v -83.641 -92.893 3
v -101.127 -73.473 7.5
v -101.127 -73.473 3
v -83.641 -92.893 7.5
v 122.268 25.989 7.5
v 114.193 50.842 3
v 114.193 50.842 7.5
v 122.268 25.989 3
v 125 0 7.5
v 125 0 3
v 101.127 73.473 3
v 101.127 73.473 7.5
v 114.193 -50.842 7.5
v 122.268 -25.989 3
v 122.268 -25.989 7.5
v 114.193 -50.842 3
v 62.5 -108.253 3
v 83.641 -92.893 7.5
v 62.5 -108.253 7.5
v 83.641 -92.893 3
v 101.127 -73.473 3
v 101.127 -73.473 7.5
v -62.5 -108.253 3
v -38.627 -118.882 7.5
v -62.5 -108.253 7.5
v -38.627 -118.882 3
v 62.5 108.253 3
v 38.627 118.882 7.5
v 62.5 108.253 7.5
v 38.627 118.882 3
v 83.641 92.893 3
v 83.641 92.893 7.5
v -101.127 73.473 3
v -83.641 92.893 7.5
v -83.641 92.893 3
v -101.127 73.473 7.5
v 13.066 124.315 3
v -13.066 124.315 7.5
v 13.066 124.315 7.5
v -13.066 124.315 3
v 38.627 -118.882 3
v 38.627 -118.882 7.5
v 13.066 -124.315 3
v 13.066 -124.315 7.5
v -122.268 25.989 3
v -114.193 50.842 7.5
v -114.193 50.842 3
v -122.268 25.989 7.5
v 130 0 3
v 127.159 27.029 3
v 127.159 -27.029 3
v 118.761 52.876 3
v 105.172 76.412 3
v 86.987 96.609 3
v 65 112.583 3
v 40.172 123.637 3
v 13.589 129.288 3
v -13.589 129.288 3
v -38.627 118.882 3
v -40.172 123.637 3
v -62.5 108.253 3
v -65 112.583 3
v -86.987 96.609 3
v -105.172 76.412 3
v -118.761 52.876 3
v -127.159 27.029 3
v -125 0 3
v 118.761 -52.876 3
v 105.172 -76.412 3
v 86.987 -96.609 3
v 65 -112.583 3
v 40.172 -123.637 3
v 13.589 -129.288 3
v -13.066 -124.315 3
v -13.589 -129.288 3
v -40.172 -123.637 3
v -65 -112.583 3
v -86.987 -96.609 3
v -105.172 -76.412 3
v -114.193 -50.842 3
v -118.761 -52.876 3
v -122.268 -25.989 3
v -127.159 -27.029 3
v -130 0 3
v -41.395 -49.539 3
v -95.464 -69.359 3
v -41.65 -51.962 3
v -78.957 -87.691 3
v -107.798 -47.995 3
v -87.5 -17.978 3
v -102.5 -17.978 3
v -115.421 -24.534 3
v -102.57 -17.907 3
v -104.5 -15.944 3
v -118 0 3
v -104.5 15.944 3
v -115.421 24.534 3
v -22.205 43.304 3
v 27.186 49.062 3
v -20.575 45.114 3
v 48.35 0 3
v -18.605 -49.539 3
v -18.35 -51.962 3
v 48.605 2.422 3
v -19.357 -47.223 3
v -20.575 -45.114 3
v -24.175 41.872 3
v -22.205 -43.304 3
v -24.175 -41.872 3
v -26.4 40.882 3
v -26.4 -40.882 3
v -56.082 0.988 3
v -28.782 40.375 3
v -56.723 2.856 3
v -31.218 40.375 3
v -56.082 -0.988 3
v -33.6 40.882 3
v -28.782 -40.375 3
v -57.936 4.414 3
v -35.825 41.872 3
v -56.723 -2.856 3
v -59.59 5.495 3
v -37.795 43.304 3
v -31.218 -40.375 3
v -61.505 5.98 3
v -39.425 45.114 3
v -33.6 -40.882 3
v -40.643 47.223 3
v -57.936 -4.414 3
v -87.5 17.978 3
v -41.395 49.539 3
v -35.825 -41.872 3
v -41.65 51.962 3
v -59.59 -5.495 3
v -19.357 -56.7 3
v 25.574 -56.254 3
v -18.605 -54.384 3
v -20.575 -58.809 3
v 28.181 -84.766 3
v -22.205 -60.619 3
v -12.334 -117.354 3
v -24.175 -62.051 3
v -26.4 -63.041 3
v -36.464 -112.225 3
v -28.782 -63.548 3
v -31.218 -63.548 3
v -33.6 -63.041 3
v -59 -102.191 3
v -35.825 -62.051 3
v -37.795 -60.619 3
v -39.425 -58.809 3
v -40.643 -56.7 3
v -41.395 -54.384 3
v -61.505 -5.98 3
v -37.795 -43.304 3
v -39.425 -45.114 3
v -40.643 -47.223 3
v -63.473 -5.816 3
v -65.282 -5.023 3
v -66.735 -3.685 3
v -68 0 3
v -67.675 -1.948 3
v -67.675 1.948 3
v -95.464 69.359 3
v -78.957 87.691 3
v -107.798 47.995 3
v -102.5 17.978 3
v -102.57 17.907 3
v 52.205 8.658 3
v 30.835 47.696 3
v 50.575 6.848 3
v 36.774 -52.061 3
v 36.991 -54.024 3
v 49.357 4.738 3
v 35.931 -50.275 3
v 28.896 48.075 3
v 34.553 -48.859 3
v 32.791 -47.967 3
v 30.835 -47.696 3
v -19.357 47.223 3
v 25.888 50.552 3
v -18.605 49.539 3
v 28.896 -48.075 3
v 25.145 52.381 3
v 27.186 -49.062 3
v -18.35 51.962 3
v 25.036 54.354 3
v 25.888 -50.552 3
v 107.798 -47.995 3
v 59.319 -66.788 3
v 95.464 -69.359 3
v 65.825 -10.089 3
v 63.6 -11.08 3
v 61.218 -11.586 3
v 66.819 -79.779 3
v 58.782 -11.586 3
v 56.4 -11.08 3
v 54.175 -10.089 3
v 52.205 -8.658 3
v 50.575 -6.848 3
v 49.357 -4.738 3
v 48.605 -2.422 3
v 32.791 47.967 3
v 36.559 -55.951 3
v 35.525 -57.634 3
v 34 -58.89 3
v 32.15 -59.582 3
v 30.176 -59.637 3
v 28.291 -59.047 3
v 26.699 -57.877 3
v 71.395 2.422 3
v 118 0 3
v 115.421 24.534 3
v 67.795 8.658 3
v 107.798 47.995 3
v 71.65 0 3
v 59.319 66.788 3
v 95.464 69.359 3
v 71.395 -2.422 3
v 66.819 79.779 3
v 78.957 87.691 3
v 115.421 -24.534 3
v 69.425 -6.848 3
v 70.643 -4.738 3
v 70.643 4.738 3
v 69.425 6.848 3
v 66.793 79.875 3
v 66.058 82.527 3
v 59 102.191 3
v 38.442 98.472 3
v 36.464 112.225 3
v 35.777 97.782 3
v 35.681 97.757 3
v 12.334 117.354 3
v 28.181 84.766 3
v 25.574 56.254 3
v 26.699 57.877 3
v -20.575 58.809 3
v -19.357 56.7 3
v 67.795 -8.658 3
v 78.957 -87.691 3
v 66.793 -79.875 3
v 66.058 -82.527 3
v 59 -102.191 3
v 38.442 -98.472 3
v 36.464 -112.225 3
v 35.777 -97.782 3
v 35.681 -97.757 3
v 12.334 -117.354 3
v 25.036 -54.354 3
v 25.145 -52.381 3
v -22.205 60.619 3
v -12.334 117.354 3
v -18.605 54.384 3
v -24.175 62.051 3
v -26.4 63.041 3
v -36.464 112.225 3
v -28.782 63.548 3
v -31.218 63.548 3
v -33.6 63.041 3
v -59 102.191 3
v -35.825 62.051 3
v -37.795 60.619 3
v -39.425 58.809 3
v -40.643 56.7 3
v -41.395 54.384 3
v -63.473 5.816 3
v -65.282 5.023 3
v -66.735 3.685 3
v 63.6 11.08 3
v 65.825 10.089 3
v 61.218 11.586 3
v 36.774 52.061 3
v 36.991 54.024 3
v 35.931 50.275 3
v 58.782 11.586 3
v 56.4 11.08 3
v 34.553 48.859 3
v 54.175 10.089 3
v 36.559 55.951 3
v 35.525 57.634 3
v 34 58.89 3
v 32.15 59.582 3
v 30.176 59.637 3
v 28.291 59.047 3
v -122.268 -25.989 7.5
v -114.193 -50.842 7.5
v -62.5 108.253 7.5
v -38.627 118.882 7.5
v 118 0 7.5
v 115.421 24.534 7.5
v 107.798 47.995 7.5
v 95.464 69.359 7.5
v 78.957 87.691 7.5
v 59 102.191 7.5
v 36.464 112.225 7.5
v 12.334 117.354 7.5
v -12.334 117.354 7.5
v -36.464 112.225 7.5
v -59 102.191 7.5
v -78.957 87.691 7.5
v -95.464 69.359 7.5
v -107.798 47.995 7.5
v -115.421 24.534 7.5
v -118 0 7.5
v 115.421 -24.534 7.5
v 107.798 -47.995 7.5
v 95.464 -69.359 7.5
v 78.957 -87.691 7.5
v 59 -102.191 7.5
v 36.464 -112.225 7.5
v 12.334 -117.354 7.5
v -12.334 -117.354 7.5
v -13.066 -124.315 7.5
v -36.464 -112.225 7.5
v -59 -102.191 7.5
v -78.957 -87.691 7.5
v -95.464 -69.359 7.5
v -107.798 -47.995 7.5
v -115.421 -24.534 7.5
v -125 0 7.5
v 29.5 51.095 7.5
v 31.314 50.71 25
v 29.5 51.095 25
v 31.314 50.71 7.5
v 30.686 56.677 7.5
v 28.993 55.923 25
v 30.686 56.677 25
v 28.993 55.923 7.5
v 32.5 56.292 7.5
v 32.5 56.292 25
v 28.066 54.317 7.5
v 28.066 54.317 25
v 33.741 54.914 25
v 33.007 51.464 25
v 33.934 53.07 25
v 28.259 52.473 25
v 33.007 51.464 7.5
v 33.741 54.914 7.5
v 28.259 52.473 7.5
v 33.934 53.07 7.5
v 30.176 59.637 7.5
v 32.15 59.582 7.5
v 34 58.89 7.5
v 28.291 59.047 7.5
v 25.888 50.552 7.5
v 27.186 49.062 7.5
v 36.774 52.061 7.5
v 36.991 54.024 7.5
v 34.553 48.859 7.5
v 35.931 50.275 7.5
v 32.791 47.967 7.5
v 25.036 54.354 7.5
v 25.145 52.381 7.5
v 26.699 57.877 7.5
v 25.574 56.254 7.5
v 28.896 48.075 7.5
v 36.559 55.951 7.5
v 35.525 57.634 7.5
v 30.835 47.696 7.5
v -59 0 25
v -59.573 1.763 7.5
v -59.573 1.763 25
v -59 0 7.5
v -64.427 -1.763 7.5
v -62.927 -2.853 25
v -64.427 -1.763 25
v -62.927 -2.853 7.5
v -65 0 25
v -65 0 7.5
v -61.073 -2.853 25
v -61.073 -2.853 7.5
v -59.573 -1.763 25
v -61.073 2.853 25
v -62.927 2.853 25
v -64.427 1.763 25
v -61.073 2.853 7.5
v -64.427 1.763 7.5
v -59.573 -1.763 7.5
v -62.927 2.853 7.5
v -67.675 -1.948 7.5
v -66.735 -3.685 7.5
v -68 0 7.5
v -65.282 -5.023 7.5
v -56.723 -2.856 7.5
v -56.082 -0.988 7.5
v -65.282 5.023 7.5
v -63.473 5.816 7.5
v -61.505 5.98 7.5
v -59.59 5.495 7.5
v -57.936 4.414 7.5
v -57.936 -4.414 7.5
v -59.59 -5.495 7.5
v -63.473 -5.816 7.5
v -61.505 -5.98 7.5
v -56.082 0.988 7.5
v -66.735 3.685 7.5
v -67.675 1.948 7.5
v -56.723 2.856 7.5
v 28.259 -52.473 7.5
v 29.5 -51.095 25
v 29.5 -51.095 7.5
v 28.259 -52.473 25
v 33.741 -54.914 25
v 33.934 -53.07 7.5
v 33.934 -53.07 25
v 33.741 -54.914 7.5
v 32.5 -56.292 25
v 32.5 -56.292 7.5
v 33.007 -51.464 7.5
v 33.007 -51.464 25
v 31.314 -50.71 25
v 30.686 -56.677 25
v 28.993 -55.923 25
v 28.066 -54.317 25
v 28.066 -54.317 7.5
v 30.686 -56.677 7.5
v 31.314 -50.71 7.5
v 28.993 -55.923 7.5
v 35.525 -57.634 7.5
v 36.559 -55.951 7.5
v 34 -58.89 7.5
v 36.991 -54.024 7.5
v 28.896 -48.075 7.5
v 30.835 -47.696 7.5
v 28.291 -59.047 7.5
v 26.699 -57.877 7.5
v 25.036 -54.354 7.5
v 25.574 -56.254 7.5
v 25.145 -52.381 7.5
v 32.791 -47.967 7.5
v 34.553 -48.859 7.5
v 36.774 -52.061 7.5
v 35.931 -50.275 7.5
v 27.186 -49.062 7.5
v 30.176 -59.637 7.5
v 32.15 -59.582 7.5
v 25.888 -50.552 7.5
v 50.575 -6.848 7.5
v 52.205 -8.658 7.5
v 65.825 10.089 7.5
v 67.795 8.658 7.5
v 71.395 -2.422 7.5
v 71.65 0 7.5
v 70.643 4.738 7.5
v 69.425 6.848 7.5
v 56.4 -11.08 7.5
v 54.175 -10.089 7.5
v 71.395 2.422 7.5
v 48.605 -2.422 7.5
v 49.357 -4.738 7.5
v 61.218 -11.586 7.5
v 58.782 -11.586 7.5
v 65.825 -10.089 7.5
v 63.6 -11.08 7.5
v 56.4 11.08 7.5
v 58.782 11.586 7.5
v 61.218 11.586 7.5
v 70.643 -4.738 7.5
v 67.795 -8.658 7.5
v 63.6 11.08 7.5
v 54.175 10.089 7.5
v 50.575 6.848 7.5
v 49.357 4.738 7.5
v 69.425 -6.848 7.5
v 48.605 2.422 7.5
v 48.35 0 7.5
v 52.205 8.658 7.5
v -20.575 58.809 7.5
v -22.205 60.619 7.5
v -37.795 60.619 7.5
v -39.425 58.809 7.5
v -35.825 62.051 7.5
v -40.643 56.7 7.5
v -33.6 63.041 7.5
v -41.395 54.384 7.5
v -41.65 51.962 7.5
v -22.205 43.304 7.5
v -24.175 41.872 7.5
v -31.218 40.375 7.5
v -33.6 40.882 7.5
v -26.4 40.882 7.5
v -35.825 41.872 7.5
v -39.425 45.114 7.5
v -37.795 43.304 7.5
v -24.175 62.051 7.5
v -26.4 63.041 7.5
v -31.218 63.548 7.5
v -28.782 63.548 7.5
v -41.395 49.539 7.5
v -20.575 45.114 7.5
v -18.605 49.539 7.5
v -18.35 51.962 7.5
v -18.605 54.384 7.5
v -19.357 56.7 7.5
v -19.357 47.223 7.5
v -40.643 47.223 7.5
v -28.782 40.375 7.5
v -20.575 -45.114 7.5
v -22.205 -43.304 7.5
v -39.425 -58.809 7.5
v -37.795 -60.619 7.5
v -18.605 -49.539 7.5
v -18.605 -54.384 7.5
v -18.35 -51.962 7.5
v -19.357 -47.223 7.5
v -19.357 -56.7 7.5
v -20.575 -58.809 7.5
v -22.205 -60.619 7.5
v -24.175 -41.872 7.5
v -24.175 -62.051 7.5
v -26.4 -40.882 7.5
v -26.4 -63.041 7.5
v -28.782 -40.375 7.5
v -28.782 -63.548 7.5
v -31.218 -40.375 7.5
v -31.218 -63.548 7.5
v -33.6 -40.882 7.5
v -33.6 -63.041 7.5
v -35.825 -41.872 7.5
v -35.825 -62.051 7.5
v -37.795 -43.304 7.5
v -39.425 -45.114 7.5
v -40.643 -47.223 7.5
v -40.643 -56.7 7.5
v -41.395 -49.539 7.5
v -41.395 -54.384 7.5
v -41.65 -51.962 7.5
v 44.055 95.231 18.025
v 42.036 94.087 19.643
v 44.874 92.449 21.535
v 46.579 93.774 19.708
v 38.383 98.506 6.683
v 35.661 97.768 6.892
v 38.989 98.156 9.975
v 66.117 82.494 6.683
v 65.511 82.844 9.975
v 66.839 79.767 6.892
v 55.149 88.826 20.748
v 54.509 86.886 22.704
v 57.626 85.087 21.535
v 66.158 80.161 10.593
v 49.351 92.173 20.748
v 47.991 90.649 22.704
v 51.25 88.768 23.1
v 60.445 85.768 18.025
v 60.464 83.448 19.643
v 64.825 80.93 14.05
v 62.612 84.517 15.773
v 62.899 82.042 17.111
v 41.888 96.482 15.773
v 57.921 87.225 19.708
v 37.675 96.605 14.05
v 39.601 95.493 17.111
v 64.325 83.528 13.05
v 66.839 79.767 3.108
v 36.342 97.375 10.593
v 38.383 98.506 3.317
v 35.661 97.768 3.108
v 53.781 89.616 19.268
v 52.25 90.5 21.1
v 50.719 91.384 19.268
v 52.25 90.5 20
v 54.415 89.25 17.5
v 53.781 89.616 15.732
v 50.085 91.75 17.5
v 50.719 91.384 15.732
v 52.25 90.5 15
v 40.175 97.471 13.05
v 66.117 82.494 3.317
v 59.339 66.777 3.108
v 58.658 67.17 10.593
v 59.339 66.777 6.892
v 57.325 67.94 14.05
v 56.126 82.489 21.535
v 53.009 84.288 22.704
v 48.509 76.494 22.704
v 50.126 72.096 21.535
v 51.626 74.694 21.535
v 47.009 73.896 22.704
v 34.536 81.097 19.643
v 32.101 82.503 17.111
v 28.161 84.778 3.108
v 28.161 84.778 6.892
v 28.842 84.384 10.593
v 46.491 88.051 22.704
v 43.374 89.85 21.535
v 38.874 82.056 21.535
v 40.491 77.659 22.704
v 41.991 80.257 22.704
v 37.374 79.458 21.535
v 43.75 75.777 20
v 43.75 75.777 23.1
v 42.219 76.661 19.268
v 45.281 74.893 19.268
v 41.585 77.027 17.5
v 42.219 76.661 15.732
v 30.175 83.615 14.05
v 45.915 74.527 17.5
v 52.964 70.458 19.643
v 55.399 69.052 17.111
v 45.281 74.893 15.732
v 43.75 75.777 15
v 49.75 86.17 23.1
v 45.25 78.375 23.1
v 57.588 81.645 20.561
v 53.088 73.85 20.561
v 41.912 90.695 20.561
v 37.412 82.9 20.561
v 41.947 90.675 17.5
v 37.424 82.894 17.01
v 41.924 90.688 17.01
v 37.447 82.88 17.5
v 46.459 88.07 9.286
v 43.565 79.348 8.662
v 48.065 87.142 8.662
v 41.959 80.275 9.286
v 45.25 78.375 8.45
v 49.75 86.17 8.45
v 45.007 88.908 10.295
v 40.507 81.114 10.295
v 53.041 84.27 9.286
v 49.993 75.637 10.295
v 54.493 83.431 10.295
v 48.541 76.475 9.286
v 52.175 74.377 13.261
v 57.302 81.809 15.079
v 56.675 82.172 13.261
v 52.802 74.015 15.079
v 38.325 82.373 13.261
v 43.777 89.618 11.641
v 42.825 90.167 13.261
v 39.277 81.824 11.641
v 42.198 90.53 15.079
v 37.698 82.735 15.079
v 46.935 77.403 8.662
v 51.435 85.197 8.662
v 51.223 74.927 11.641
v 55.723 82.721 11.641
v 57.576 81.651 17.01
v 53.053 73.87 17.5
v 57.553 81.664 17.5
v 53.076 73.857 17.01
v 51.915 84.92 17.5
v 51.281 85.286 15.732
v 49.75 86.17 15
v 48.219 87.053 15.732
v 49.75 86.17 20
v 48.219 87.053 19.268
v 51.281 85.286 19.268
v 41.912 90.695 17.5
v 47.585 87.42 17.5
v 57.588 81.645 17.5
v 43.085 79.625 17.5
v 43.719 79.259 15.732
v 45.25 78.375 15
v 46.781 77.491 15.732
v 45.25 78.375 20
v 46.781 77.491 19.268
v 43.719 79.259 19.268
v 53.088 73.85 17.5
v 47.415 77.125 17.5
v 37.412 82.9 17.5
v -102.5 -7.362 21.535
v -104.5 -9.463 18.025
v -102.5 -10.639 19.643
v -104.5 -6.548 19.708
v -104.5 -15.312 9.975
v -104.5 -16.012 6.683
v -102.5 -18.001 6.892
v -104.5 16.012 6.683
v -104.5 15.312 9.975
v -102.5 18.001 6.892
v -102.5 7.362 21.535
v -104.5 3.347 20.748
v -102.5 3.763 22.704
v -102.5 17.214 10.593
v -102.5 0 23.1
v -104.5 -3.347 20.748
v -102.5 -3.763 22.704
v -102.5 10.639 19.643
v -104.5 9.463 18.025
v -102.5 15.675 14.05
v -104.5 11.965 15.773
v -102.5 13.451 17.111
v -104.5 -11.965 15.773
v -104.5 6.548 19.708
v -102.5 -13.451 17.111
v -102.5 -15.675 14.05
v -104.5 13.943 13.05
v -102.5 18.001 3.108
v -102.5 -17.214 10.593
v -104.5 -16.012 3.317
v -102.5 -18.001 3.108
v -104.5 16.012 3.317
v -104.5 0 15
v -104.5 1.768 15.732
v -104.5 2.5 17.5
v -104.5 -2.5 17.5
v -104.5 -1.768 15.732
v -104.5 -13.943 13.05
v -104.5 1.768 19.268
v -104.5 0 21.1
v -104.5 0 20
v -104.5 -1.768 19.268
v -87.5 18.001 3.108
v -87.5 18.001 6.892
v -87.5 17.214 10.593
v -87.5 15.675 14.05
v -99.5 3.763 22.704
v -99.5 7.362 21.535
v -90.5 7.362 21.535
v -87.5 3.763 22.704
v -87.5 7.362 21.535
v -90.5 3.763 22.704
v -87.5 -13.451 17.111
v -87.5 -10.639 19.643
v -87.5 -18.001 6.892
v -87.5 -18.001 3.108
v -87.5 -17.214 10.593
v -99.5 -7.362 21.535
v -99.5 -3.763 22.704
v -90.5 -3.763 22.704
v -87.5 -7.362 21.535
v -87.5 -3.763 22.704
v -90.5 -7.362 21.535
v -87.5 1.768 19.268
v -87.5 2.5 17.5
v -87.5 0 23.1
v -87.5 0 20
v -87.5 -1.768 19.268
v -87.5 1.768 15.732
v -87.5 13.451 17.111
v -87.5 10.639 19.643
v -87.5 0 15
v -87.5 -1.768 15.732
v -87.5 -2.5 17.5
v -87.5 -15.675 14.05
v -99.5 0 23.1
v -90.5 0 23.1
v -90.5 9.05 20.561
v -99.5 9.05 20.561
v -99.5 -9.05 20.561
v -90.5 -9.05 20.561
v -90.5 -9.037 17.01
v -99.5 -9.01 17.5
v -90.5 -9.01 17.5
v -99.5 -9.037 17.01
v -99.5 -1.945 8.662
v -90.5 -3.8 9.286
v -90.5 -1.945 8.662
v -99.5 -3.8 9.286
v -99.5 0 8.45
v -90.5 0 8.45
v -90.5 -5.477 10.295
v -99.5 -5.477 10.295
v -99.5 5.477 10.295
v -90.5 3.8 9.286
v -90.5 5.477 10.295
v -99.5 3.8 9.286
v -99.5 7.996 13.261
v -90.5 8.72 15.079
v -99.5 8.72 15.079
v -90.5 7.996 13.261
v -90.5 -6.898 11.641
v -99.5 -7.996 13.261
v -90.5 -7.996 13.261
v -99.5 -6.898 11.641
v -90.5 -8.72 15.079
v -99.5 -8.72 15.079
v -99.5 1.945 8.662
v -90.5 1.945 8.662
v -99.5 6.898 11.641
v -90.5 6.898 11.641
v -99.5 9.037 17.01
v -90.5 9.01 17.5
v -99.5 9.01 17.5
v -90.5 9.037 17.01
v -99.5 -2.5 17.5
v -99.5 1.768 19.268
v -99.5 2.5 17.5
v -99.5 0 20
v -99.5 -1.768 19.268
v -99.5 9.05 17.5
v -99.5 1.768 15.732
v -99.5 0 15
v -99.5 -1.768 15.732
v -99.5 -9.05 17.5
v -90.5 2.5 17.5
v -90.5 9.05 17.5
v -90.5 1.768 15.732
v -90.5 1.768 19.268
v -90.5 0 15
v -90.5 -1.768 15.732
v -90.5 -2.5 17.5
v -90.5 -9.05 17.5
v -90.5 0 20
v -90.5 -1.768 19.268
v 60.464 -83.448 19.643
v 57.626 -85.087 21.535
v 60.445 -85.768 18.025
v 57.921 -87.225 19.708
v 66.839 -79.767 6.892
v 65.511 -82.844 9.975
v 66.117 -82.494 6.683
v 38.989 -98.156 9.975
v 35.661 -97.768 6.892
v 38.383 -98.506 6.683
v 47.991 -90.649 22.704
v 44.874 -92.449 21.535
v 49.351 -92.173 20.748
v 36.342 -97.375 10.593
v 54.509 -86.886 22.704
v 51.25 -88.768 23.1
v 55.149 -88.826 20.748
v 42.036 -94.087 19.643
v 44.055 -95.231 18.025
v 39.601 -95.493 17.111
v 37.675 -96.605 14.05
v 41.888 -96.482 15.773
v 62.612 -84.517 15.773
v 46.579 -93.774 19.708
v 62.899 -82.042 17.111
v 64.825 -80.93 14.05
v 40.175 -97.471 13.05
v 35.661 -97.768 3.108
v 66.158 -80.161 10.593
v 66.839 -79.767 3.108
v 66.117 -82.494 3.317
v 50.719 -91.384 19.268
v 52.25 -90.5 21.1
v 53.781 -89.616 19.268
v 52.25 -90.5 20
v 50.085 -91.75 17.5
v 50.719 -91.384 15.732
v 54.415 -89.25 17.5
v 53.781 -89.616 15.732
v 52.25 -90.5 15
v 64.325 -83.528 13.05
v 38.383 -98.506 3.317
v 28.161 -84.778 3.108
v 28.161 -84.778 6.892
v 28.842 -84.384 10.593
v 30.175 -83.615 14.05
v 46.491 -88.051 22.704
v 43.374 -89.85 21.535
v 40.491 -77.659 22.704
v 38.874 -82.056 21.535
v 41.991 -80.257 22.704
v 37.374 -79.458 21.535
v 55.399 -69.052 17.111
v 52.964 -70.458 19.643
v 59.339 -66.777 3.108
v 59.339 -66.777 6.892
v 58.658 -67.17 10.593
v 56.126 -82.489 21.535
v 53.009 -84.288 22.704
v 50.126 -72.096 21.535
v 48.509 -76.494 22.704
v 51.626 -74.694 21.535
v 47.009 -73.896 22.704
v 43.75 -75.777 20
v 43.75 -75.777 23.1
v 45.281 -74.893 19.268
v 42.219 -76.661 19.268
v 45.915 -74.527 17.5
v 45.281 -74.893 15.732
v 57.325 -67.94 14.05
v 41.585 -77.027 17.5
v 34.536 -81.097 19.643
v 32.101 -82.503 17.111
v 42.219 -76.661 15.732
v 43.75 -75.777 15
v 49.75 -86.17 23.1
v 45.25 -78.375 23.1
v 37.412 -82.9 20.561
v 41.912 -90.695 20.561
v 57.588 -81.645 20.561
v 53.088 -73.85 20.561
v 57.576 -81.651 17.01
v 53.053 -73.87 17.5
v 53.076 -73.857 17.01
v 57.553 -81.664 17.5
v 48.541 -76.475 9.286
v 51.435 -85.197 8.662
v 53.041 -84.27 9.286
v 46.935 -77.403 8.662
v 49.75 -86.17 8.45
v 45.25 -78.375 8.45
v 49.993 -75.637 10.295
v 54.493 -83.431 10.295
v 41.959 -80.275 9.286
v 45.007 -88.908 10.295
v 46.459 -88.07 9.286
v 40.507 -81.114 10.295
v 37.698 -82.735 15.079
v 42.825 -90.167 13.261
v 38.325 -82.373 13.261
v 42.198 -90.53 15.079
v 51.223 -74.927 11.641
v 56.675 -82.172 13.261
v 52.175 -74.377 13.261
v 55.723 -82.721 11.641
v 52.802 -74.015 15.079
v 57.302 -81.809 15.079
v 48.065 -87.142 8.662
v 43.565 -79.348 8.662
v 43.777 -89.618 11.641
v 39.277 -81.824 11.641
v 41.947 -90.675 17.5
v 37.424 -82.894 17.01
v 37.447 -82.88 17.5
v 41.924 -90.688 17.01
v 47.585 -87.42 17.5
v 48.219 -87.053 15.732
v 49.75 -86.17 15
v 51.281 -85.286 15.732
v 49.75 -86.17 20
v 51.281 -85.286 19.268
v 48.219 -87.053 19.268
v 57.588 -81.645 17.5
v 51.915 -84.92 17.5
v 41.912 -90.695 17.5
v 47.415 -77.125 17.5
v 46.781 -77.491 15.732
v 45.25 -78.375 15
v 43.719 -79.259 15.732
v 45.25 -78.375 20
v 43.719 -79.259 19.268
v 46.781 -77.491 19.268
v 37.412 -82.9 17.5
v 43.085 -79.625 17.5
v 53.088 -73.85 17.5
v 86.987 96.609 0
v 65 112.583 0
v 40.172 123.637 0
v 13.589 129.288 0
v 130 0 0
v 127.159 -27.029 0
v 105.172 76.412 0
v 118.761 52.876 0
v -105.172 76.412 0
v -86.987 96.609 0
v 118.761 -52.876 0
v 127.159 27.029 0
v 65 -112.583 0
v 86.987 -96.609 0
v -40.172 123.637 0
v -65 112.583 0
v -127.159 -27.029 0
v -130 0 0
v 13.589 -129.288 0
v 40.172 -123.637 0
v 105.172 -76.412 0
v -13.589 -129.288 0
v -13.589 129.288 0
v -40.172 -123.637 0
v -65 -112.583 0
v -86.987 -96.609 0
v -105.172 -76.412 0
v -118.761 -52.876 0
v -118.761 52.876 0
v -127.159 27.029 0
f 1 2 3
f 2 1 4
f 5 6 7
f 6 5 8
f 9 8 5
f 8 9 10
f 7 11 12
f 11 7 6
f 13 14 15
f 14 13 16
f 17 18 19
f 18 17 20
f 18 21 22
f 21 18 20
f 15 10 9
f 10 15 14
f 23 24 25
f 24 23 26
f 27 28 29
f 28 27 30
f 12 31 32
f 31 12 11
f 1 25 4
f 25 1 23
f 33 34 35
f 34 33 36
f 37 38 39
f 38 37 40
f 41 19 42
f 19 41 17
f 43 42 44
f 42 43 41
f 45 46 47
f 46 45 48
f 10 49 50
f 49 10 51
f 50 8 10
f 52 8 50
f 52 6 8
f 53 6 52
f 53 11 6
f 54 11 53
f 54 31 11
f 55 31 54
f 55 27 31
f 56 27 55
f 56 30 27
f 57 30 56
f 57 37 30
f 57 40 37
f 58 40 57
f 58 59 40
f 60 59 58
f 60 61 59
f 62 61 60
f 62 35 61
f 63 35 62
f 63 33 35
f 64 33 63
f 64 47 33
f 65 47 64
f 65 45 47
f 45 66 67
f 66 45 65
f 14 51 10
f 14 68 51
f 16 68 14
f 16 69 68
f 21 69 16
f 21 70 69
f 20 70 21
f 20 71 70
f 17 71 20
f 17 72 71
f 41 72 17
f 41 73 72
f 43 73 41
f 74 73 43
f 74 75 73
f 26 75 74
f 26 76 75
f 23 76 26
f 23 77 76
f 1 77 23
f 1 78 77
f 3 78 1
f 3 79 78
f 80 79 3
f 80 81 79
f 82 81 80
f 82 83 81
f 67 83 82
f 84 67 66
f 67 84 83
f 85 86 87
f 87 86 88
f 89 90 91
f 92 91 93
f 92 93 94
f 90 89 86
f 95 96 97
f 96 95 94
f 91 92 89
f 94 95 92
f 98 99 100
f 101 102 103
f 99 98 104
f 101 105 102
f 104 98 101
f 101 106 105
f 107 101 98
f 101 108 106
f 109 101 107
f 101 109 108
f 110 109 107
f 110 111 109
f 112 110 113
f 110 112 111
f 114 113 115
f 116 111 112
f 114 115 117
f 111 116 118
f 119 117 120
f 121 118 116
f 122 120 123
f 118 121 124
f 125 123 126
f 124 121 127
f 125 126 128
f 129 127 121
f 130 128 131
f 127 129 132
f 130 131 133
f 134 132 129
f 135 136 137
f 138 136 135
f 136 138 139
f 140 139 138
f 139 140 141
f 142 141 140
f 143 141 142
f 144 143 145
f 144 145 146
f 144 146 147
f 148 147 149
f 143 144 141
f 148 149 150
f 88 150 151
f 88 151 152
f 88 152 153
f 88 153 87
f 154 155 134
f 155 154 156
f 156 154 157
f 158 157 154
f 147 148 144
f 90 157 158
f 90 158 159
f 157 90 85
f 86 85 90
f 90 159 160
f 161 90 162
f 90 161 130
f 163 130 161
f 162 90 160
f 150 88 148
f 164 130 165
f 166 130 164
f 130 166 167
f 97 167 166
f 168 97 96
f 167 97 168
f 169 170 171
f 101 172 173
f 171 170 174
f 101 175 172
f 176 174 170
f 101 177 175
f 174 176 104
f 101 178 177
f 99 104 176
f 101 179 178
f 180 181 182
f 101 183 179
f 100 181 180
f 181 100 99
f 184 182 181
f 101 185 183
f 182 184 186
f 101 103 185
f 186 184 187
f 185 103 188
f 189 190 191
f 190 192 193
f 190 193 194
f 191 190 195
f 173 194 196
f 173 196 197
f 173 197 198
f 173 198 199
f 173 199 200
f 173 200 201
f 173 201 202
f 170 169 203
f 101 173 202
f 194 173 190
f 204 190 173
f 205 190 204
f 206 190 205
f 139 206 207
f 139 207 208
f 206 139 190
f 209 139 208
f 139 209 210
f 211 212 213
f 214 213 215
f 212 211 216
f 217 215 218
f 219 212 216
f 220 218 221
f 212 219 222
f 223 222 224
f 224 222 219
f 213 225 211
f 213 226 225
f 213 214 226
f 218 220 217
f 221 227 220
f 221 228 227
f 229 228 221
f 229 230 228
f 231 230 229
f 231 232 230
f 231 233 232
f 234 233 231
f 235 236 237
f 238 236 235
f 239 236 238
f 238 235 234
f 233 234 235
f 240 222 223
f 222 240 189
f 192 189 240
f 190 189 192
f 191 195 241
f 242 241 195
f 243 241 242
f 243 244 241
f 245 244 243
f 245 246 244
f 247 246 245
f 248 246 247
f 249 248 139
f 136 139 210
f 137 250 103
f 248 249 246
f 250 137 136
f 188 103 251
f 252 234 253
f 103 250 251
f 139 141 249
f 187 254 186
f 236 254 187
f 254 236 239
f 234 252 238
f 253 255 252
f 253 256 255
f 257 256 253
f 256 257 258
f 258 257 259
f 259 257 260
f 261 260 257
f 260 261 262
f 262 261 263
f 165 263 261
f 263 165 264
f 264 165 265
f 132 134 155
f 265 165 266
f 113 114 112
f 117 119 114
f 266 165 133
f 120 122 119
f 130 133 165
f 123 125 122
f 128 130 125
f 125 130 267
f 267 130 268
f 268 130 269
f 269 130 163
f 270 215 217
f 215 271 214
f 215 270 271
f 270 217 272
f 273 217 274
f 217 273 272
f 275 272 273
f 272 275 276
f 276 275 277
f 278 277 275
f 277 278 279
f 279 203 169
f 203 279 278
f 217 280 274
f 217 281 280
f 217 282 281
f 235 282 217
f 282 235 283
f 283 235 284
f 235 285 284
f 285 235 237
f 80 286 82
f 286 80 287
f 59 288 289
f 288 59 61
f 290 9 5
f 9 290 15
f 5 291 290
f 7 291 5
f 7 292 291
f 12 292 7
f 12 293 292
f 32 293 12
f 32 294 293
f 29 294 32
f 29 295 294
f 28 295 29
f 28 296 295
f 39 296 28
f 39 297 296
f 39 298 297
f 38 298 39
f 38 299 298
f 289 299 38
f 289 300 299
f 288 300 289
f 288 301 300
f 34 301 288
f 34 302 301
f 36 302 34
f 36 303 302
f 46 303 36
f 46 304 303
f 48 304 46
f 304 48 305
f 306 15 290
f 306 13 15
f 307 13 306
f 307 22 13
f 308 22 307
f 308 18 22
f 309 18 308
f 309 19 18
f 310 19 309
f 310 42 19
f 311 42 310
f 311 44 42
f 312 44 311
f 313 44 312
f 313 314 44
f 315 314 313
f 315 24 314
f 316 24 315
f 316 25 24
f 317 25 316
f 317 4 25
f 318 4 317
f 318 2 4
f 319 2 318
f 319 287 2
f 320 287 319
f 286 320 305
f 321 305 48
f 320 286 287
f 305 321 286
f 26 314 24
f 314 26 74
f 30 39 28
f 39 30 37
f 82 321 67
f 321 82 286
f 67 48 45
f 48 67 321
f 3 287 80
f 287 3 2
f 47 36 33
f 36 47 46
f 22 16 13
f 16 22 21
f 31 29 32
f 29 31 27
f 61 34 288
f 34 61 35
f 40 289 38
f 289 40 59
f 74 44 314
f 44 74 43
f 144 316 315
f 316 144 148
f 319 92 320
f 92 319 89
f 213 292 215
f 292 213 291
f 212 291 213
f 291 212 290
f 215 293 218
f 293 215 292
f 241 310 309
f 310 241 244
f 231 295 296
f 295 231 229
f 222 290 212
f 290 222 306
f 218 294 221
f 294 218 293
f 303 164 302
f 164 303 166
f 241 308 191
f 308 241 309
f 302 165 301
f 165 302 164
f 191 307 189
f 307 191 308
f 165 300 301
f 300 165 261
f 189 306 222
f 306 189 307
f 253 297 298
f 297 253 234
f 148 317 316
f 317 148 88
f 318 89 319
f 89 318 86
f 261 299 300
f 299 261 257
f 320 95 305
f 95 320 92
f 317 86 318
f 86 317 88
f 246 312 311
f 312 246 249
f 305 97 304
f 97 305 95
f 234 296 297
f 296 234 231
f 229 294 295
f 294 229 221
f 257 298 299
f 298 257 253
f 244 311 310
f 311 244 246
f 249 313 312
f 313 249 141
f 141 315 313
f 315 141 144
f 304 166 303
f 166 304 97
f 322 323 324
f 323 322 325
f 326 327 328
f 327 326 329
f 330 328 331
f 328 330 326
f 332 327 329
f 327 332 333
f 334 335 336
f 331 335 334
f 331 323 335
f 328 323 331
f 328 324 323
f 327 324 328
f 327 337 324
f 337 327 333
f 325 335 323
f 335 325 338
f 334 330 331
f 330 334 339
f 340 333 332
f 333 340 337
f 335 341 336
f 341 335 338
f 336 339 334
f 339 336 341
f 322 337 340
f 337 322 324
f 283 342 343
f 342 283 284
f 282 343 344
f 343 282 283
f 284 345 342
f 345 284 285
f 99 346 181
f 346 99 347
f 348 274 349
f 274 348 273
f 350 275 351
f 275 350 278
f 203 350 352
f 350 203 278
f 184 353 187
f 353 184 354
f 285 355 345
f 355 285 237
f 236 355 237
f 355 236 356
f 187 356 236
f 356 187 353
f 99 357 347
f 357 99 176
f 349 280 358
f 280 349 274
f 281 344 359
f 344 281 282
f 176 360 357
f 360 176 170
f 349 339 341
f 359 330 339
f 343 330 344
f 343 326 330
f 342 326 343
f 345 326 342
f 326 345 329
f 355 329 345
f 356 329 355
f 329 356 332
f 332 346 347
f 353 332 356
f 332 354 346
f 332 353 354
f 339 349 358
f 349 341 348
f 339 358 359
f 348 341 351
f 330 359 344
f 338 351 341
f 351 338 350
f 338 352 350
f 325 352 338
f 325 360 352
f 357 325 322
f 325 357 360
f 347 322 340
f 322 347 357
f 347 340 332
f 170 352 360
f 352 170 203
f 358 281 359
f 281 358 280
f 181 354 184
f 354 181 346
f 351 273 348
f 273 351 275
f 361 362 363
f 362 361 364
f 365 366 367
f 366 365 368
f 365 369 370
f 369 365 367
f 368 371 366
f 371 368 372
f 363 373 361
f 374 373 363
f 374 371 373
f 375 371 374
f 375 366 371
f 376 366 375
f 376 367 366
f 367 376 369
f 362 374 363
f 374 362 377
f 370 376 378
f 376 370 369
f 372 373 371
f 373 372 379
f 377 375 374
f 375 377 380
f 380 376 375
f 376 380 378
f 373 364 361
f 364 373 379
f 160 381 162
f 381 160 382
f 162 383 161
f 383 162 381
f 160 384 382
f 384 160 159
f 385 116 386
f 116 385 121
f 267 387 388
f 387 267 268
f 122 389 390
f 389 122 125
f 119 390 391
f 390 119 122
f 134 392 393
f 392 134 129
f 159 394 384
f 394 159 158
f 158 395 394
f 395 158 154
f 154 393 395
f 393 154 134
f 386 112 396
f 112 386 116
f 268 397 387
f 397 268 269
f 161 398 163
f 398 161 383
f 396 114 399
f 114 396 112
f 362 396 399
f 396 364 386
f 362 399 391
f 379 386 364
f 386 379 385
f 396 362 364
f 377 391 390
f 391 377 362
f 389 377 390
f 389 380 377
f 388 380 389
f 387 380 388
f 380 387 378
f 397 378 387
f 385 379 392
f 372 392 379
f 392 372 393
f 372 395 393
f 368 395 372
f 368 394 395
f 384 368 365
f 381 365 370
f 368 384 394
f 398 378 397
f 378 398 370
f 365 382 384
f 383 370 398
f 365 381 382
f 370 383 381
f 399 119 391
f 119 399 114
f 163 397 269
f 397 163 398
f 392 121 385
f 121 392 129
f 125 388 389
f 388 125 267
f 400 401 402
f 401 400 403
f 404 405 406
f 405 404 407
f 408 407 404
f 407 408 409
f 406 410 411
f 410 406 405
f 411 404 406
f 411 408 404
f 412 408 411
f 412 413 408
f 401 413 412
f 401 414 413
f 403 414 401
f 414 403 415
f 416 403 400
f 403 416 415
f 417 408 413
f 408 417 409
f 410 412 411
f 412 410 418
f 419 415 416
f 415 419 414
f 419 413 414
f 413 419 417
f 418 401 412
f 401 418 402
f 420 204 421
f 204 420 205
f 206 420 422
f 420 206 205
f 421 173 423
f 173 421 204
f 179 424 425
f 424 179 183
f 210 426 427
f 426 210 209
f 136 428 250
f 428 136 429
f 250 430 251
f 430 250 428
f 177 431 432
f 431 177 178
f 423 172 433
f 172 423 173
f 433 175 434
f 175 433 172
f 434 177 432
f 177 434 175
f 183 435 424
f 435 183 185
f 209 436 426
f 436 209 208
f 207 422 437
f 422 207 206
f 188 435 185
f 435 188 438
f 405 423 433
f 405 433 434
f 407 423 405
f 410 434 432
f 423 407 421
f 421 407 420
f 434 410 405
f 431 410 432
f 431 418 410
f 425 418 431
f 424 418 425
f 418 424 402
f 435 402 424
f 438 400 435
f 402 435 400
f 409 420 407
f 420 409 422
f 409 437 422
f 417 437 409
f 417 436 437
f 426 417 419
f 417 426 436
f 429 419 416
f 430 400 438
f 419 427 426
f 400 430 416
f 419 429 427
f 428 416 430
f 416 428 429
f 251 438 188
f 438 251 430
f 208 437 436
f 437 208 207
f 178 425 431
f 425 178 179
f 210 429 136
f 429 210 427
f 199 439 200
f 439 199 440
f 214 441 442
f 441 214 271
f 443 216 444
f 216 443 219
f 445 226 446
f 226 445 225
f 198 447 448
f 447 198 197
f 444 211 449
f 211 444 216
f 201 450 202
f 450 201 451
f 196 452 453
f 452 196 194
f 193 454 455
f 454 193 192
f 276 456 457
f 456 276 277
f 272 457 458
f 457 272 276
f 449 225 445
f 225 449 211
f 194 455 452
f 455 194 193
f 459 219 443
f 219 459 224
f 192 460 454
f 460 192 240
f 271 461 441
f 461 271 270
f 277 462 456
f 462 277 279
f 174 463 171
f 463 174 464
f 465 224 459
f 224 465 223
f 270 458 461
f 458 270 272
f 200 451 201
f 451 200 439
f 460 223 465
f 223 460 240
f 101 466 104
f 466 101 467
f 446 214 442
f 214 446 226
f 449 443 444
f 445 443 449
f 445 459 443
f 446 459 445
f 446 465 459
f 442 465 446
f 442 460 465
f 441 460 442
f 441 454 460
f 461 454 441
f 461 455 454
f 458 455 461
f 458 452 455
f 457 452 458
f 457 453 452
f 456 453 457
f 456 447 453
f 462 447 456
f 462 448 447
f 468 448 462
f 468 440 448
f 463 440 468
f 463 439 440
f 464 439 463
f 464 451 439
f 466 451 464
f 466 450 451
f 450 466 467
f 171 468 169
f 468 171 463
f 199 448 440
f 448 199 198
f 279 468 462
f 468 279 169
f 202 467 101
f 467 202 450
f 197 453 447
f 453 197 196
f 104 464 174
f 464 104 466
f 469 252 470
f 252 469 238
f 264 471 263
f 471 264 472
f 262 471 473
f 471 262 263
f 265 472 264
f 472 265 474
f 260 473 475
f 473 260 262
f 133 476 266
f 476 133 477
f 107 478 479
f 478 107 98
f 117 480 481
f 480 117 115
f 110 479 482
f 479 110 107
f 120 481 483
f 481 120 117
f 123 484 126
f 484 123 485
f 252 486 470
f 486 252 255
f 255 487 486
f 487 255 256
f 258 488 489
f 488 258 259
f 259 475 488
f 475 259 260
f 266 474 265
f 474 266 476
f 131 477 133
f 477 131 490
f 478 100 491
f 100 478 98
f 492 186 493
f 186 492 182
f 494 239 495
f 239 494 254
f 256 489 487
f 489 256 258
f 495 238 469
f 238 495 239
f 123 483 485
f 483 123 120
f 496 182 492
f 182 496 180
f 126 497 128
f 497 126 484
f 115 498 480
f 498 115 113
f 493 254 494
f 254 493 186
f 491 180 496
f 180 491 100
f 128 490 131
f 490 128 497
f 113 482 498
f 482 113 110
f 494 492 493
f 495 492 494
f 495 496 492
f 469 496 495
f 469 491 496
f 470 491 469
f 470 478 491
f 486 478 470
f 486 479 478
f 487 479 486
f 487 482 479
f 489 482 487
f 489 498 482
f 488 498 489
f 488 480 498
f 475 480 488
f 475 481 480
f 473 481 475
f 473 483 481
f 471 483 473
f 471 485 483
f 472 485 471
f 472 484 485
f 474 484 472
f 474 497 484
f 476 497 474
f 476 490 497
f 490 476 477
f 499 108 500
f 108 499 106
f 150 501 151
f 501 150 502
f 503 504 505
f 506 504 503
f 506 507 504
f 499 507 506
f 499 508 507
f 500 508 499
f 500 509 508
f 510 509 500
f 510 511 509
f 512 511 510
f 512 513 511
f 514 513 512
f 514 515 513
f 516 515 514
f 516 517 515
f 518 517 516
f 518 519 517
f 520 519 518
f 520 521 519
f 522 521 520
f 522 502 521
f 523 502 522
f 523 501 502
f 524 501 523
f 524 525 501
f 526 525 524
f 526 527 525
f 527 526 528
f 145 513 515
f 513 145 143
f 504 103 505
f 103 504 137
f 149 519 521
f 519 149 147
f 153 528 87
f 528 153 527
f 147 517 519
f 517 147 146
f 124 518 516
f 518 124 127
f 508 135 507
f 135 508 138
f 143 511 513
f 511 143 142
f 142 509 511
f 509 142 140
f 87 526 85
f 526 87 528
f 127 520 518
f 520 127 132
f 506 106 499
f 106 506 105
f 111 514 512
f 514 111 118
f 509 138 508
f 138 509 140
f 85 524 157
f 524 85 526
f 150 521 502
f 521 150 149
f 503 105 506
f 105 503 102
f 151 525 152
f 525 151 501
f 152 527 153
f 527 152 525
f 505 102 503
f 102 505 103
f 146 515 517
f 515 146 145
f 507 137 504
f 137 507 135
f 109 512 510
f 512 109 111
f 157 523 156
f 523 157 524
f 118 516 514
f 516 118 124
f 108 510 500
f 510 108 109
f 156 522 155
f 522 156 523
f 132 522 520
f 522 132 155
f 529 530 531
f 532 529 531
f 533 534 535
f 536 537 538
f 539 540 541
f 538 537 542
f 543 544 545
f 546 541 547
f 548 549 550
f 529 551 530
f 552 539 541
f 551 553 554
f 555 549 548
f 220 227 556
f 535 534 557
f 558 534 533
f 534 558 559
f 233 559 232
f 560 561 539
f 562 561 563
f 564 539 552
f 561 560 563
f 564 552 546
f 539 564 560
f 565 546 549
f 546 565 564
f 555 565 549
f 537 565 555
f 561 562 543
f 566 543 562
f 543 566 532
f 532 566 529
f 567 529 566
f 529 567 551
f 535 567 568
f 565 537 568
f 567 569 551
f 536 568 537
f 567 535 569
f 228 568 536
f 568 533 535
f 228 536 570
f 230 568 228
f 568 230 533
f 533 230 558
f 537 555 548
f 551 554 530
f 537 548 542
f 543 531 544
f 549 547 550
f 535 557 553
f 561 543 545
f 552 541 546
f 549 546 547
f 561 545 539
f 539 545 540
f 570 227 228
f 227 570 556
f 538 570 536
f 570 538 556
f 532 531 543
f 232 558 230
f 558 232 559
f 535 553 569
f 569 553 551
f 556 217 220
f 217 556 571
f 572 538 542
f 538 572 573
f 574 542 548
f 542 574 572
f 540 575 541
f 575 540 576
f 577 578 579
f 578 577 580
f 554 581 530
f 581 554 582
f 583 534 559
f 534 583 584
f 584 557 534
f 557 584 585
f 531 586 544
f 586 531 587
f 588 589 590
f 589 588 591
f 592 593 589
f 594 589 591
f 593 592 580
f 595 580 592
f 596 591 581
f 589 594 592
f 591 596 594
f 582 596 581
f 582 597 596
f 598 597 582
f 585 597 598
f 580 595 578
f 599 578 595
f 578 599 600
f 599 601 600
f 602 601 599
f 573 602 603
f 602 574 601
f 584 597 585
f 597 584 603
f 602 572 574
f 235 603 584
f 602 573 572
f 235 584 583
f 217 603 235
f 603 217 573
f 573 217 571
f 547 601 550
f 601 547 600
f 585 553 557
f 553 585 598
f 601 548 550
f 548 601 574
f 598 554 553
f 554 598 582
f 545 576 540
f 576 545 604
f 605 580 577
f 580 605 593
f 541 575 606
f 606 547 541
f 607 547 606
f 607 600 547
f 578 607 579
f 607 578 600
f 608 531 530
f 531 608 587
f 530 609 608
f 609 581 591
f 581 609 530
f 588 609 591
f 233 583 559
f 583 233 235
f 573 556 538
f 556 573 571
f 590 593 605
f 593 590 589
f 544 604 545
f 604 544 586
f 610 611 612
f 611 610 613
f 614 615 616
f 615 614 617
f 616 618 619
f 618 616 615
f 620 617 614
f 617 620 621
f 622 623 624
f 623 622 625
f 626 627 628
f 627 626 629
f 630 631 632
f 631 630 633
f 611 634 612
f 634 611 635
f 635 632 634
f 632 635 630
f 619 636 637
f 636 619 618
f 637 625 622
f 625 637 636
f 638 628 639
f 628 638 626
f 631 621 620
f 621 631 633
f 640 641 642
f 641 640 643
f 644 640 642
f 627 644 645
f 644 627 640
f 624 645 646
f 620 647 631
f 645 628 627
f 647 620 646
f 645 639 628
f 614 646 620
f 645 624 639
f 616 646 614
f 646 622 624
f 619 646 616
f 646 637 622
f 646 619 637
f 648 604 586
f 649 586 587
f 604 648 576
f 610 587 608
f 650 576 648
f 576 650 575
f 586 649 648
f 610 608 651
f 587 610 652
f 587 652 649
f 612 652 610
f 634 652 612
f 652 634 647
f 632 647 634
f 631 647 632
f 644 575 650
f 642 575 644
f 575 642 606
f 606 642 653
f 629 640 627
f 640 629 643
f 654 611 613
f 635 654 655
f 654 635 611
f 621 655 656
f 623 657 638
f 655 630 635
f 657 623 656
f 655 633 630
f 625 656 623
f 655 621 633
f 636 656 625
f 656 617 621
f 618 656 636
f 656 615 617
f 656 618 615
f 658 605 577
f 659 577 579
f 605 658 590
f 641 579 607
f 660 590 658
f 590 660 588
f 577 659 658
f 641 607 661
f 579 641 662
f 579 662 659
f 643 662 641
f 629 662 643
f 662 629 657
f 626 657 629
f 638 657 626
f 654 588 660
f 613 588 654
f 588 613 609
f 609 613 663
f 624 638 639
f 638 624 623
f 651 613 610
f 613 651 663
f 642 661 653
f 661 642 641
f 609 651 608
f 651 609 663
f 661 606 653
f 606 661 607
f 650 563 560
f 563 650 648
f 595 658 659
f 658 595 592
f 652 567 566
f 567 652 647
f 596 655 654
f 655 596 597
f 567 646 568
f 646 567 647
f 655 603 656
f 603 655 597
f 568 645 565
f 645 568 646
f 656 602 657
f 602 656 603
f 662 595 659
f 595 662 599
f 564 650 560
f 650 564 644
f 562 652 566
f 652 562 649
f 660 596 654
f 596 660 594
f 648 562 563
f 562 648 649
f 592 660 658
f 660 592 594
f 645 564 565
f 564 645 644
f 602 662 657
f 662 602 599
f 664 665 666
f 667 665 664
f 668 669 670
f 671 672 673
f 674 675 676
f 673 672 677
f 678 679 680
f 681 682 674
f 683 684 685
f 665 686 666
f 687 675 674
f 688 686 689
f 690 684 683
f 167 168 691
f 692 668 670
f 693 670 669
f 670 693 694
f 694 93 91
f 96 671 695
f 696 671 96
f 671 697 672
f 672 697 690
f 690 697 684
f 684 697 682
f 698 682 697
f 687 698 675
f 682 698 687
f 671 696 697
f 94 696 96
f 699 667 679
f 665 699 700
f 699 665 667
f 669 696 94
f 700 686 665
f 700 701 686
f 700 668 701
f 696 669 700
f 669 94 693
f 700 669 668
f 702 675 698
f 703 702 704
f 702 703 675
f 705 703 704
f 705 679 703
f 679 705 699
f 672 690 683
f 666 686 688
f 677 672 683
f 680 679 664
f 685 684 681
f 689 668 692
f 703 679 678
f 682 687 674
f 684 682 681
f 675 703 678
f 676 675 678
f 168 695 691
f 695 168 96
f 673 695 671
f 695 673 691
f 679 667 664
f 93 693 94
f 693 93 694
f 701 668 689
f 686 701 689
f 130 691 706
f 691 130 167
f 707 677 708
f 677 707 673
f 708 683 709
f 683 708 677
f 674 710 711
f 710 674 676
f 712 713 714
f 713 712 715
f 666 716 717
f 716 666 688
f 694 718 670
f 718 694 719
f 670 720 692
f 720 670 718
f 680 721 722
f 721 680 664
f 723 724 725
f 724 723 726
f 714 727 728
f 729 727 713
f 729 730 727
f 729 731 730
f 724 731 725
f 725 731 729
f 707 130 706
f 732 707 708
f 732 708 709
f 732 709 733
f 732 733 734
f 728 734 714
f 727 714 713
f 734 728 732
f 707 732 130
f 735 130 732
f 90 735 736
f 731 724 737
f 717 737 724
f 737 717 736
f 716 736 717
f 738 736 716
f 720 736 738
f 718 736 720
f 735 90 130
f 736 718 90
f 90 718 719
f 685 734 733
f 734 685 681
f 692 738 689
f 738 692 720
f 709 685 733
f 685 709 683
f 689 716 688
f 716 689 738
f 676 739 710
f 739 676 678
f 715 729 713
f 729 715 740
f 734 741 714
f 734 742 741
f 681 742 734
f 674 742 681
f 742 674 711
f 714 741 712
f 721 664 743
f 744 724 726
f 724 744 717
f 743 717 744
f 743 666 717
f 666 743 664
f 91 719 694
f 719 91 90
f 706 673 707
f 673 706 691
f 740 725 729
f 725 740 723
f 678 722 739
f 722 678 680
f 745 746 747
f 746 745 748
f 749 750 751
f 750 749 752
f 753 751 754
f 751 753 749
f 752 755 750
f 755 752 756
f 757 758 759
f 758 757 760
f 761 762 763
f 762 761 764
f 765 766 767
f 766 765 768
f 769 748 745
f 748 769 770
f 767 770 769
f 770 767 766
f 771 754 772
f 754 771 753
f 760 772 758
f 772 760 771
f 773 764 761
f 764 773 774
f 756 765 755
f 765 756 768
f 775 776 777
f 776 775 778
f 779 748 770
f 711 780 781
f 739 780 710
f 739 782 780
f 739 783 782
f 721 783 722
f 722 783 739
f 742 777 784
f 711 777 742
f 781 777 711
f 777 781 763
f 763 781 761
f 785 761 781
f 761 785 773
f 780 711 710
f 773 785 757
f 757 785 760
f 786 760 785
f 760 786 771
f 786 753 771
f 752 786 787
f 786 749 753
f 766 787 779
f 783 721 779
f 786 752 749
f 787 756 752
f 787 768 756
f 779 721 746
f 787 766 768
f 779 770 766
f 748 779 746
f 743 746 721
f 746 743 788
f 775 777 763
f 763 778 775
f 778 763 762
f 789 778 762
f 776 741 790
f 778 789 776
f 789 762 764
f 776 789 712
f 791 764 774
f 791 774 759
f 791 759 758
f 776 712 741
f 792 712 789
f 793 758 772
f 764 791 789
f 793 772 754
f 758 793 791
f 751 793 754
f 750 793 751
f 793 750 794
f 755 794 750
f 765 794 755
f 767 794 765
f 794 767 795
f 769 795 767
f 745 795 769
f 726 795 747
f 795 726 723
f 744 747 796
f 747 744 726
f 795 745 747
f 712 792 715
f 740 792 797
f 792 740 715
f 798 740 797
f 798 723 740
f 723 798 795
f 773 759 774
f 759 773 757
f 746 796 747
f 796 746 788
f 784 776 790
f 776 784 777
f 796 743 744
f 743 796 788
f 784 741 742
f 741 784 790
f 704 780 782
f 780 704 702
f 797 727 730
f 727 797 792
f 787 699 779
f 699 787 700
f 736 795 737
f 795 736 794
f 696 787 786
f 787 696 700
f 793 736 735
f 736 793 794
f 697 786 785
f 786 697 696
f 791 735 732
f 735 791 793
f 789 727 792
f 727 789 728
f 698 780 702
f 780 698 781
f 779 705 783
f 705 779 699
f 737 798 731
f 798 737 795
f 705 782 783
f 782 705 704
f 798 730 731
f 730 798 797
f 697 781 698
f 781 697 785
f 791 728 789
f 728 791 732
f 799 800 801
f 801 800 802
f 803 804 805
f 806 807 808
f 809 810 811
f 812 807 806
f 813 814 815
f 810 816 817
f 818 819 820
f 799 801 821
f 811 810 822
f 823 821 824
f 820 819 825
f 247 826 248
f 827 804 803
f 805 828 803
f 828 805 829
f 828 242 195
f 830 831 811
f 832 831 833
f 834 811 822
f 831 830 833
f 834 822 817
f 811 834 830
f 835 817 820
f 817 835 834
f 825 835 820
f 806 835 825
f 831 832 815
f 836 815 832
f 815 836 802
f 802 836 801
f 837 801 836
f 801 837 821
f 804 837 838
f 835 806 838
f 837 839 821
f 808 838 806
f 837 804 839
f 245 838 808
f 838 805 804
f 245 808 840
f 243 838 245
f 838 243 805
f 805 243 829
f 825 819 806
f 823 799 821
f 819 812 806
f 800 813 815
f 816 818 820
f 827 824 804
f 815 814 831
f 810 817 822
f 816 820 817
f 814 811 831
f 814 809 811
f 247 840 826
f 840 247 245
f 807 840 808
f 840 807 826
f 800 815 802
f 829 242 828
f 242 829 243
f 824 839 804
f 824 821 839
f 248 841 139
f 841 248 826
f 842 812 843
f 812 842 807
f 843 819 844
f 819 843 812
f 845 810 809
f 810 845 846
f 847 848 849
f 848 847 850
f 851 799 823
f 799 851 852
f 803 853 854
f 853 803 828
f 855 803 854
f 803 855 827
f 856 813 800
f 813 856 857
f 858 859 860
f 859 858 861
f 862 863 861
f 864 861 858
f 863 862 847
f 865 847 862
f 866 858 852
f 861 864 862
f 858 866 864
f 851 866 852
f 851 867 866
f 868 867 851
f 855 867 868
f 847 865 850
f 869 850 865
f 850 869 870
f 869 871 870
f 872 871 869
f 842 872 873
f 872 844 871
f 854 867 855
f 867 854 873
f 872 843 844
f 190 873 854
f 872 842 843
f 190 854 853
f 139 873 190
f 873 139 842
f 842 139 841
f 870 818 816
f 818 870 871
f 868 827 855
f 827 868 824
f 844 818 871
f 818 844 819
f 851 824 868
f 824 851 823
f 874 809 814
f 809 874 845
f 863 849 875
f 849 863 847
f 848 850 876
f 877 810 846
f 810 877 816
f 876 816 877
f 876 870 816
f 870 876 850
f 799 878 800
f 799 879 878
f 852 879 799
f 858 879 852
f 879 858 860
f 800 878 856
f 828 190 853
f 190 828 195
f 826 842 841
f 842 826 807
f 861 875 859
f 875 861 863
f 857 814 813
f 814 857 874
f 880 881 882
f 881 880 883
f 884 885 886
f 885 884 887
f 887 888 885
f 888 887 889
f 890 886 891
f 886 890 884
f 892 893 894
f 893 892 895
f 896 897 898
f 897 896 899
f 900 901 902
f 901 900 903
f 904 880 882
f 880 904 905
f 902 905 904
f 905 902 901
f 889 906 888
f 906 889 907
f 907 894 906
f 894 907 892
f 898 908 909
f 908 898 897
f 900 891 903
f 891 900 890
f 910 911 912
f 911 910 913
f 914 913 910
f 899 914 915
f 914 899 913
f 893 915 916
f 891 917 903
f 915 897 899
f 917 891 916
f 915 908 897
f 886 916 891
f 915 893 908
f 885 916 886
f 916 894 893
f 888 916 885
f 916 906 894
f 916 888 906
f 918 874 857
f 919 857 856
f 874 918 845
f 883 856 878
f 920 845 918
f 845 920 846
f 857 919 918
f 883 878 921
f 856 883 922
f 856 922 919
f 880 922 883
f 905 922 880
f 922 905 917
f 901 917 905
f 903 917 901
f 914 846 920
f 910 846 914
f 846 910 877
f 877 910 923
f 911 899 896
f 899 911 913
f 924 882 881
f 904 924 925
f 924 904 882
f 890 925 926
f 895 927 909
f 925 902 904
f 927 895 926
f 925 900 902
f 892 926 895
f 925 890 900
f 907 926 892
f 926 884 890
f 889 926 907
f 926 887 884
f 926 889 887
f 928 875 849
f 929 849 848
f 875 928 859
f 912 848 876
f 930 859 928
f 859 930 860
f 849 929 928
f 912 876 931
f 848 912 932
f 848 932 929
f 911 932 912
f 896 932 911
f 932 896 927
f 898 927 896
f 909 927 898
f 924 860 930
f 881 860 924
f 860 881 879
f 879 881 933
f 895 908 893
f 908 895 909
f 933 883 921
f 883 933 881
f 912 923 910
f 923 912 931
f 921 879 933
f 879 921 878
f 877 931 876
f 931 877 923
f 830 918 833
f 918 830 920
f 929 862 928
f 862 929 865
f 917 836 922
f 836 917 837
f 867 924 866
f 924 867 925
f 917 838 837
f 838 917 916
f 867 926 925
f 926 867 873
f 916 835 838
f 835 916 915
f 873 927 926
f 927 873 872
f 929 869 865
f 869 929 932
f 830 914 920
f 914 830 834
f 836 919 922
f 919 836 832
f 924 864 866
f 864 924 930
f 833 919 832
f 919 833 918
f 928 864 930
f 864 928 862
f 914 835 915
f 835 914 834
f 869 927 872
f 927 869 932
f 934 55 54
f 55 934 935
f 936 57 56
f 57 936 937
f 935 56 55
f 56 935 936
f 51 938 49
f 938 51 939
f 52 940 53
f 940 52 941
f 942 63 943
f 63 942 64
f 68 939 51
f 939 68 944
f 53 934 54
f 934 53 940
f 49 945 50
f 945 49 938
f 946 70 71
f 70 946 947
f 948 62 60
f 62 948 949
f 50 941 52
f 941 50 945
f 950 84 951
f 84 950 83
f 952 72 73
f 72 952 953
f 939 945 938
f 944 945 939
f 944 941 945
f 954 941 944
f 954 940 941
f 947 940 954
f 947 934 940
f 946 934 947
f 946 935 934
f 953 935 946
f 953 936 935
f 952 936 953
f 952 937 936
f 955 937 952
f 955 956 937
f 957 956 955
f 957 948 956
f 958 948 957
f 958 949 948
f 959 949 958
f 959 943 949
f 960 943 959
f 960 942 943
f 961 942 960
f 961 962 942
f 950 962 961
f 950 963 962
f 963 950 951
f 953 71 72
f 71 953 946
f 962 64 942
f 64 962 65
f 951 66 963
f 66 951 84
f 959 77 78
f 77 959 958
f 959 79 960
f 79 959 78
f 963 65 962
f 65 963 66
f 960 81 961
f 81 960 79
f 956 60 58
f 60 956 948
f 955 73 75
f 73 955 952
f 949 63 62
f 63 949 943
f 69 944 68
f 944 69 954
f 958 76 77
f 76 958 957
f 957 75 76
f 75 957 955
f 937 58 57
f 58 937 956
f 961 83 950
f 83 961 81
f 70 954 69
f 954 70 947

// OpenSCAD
// file: ../../ots/bearing.scad
use <../utility/ring.scad>

function create_bearing_dims(bearing_ID, bearing_OD, bearing_width) = [bearing_ID, bearing_OD, bearing_width];

module bearing(bearing_dims) {

	bearing_ID = bearing_dims[0];
	bearing_OD = bearing_dims[1];
	bearing_width = bearing_dims[2];

	color("white")
	ring(bearing_ID, bearing_OD, bearing_width);
}

bearing_dims = create_bearing_dims(5, 23, 7);
bearing(bearing_dims);
// file: ../../utility/ring.scad
// some defaults for testing
ID = 5;
OD = 10;
width = 5;



module ring(ID, OD, width) {
    difference() {
	    cylinder(r=OD/2, h=width, center=true);
	    cylinder(r=ID/2, h=width+2, center=true);
	}
}

ring(ID, OD, width);
// main file
use <../../utility/ring.scad>
use <../../ots/bearing.scad>

module jogwheel_bottom(bottom_params) {

    bottom_outer_rad = bottom_params[0];
    bottom_thickness = bottom_params[1];
    outer_ring_params = bottom_params[2];
    spring_params = bottom_params[3];
    sensor_params = bottom_params[4];
    bearing_params = bottom_params[5];
    clearances = bottom_params[6];


    // unpack lower level params
    outer_ring_thickness = outer_ring_params[0];
    outer_ring_width = outer_ring_params[1];

    spring_rad_offset = spring_params[0];
    spring_base_supp_height = spring_params[1];
    spring_dims = spring_params[2];

    spring_OD = spring_dims[0];
    spring_ID = spring_dims[1];
    spring_len = spring_dims[2];

    sensor_rad_offset = sensor_params[0];
    sensor_base_supp_height = sensor_params[1];
    sensor_dims = sensor_params[2];

    sensor_OD = sensor_dims[0];

    outer_bear_rad_offset = bearing_params[0];
    outer_bear_vert_offset = bearing_params[1];
    inner_bear_rad_offset = bearing_params[2];
    inner_bear_vert_offset = bearing_params[3];
    bearing_dims = bearing_params[4];
    bear_ID = bearing_dims[0];
    bear_OD = bearing_dims[1];
    bear_width = bearing_dims[2];
    screw_length = bearing_params[5];

    clearance = clearances[0];
    outer_clear = clearances[1];

    // calculate other params from inputs


    bear_gap_width = bear_width + 2*clearance;

    bear_ret_circ_offset = 5;
    bear_ret_flat_width = 15;
    bear_ret_lrad = bear_OD*0.7 + 2*clearance;
    bear_ret_rad_diff = 2;
    bear_ret_srad = bear_ret_lrad - bear_ret_rad_diff;
    bearing_ret_params = [bear_ret_circ_offset, bear_ret_flat_width, bear_ret_lrad, bear_ret_rad_diff, bear_ret_srad];

    // a constant, shouldn't need to change
    bearing_ang_offset = 60;


    //color("blue")
    union() {
        // base plate
        cylinder(r=bottom_outer_rad + outer_clear, h=bottom_thickness);

        //ring at jogwheel outer
        translate([0, 0, bottom_thickness + outer_ring_width/2])
            ring(2*(bottom_outer_rad - outer_ring_thickness), 2*bottom_outer_rad, outer_ring_width);

        //spring retainers
        for(i = [0:2]) {
            rotate([0, 0, bearing_ang_offset + 120*i])
                translate([spring_rad_offset, 0, bottom_thickness]) {
                    // spring rod 
                    cylinder(d=spring_ID - 2*clearance, h=spring_len + 2*clearance);
                    // spring base
                    cylinder(r=spring_OD, h=spring_base_supp_height);
                }
        }

        //sensor pads
        for(i = [0:2]) {
            rotate([0,0,120*i])
                translate([sensor_rad_offset, 0, bottom_thickness])
                cylinder(d=sensor_OD+ 5*clearance, h=sensor_base_supp_height);
        }

        //bearing retainers
        for(i = [0:2]) {
            rotate([0,0,bearing_ang_offset + 120*i])
                translate([outer_bear_rad_offset, 0, bear_ret_circ_offset])
                rotate([0,90,0])
                difference(){
                    union(){
                        translate([0, 0, bear_ret_flat_width/2])
                            cylinder(r1=bear_ret_lrad, r2=bear_ret_srad, h=bear_ret_rad_diff);
                        cylinder(r=bear_ret_lrad, h=bear_ret_flat_width, center=true);
                    }
                    translate([bear_ret_lrad+bear_ret_circ_offset, 0, clearance])
                        cube(size=bear_ret_lrad*2 + clearance, center=true);

                    // cutouts for bearings
                    translate([-outer_bear_vert_offset, 0, 0])
                        union() {
                            cylinder(d=bear_ret_lrad, h=bear_gap_width, center=true);
                            translate([-bear_ret_lrad/2, 0, 0])
                                cube([bear_ret_lrad, bear_ret_lrad, bear_gap_width], center=true);
                            cylinder(d=bear_ID, h=screw_length, center=true);
                        }
                }
        }
    }
}


// // default values for testing, overwritten by assembly
// jogwheel_outer_rad = 125;
//
// ring_thickness = 7;
// ring_width = 4.5;
//
// bear_ID = 5;
// bear_OD = 23;
// bear_width = 7;
// bear_dims = create_bearing_dims(bear_ID, bear_OD, bear_width);
//
// spring_ID = 6;
// spring_OD = 8;
// spring_len = 20;
// spring_dims = [spring_ID, spring_OD, spring_len];
//
// spring_rad_offset = 55;
// spring_base_supp_height = ring_width;
// spring_params = [spring_rad_offset, spring_base_supp_height, spring_dims];
//
// sensor_OD = 18.3;
// sensor_thick = 0.4;
// sensor_rad_offset = 60;
// sensor_base_supp_height = ring_width;
// sensor_params = [sensor_rad_offset, sensor_base_supp_height];
//
//
// outer_bear_rad_offset = 92;
// outer_bear_vert_offset = 16.5;
//
// screw_length = 21;
//
//
//
//
// // set clearance distance
// clearance = 1;
// outer_clear = 5;
// thickness = 3;
// clearances = [clearance, outer_clear];
//
// // parameters set based on above
// base_thickness = thickness;
//
//
// outer_ring_params = [ring_thickness, ring_width];
// bottom_params = [jogwheel_outer_rad, thickness, outer_ring_params, spring_params, sensor_params, bear_dims, clearances];
//
// jogwheel_bottom(bottom_params);
jogwheel_bottom([125, 3, [7,4.5], [62,4.5,[6,8,20,0.8]], [60,4.5,[18.3,0.4,17.85,6.6]], [95,12.5,60,14.5,[5,23,7],21], [1,5]]);
